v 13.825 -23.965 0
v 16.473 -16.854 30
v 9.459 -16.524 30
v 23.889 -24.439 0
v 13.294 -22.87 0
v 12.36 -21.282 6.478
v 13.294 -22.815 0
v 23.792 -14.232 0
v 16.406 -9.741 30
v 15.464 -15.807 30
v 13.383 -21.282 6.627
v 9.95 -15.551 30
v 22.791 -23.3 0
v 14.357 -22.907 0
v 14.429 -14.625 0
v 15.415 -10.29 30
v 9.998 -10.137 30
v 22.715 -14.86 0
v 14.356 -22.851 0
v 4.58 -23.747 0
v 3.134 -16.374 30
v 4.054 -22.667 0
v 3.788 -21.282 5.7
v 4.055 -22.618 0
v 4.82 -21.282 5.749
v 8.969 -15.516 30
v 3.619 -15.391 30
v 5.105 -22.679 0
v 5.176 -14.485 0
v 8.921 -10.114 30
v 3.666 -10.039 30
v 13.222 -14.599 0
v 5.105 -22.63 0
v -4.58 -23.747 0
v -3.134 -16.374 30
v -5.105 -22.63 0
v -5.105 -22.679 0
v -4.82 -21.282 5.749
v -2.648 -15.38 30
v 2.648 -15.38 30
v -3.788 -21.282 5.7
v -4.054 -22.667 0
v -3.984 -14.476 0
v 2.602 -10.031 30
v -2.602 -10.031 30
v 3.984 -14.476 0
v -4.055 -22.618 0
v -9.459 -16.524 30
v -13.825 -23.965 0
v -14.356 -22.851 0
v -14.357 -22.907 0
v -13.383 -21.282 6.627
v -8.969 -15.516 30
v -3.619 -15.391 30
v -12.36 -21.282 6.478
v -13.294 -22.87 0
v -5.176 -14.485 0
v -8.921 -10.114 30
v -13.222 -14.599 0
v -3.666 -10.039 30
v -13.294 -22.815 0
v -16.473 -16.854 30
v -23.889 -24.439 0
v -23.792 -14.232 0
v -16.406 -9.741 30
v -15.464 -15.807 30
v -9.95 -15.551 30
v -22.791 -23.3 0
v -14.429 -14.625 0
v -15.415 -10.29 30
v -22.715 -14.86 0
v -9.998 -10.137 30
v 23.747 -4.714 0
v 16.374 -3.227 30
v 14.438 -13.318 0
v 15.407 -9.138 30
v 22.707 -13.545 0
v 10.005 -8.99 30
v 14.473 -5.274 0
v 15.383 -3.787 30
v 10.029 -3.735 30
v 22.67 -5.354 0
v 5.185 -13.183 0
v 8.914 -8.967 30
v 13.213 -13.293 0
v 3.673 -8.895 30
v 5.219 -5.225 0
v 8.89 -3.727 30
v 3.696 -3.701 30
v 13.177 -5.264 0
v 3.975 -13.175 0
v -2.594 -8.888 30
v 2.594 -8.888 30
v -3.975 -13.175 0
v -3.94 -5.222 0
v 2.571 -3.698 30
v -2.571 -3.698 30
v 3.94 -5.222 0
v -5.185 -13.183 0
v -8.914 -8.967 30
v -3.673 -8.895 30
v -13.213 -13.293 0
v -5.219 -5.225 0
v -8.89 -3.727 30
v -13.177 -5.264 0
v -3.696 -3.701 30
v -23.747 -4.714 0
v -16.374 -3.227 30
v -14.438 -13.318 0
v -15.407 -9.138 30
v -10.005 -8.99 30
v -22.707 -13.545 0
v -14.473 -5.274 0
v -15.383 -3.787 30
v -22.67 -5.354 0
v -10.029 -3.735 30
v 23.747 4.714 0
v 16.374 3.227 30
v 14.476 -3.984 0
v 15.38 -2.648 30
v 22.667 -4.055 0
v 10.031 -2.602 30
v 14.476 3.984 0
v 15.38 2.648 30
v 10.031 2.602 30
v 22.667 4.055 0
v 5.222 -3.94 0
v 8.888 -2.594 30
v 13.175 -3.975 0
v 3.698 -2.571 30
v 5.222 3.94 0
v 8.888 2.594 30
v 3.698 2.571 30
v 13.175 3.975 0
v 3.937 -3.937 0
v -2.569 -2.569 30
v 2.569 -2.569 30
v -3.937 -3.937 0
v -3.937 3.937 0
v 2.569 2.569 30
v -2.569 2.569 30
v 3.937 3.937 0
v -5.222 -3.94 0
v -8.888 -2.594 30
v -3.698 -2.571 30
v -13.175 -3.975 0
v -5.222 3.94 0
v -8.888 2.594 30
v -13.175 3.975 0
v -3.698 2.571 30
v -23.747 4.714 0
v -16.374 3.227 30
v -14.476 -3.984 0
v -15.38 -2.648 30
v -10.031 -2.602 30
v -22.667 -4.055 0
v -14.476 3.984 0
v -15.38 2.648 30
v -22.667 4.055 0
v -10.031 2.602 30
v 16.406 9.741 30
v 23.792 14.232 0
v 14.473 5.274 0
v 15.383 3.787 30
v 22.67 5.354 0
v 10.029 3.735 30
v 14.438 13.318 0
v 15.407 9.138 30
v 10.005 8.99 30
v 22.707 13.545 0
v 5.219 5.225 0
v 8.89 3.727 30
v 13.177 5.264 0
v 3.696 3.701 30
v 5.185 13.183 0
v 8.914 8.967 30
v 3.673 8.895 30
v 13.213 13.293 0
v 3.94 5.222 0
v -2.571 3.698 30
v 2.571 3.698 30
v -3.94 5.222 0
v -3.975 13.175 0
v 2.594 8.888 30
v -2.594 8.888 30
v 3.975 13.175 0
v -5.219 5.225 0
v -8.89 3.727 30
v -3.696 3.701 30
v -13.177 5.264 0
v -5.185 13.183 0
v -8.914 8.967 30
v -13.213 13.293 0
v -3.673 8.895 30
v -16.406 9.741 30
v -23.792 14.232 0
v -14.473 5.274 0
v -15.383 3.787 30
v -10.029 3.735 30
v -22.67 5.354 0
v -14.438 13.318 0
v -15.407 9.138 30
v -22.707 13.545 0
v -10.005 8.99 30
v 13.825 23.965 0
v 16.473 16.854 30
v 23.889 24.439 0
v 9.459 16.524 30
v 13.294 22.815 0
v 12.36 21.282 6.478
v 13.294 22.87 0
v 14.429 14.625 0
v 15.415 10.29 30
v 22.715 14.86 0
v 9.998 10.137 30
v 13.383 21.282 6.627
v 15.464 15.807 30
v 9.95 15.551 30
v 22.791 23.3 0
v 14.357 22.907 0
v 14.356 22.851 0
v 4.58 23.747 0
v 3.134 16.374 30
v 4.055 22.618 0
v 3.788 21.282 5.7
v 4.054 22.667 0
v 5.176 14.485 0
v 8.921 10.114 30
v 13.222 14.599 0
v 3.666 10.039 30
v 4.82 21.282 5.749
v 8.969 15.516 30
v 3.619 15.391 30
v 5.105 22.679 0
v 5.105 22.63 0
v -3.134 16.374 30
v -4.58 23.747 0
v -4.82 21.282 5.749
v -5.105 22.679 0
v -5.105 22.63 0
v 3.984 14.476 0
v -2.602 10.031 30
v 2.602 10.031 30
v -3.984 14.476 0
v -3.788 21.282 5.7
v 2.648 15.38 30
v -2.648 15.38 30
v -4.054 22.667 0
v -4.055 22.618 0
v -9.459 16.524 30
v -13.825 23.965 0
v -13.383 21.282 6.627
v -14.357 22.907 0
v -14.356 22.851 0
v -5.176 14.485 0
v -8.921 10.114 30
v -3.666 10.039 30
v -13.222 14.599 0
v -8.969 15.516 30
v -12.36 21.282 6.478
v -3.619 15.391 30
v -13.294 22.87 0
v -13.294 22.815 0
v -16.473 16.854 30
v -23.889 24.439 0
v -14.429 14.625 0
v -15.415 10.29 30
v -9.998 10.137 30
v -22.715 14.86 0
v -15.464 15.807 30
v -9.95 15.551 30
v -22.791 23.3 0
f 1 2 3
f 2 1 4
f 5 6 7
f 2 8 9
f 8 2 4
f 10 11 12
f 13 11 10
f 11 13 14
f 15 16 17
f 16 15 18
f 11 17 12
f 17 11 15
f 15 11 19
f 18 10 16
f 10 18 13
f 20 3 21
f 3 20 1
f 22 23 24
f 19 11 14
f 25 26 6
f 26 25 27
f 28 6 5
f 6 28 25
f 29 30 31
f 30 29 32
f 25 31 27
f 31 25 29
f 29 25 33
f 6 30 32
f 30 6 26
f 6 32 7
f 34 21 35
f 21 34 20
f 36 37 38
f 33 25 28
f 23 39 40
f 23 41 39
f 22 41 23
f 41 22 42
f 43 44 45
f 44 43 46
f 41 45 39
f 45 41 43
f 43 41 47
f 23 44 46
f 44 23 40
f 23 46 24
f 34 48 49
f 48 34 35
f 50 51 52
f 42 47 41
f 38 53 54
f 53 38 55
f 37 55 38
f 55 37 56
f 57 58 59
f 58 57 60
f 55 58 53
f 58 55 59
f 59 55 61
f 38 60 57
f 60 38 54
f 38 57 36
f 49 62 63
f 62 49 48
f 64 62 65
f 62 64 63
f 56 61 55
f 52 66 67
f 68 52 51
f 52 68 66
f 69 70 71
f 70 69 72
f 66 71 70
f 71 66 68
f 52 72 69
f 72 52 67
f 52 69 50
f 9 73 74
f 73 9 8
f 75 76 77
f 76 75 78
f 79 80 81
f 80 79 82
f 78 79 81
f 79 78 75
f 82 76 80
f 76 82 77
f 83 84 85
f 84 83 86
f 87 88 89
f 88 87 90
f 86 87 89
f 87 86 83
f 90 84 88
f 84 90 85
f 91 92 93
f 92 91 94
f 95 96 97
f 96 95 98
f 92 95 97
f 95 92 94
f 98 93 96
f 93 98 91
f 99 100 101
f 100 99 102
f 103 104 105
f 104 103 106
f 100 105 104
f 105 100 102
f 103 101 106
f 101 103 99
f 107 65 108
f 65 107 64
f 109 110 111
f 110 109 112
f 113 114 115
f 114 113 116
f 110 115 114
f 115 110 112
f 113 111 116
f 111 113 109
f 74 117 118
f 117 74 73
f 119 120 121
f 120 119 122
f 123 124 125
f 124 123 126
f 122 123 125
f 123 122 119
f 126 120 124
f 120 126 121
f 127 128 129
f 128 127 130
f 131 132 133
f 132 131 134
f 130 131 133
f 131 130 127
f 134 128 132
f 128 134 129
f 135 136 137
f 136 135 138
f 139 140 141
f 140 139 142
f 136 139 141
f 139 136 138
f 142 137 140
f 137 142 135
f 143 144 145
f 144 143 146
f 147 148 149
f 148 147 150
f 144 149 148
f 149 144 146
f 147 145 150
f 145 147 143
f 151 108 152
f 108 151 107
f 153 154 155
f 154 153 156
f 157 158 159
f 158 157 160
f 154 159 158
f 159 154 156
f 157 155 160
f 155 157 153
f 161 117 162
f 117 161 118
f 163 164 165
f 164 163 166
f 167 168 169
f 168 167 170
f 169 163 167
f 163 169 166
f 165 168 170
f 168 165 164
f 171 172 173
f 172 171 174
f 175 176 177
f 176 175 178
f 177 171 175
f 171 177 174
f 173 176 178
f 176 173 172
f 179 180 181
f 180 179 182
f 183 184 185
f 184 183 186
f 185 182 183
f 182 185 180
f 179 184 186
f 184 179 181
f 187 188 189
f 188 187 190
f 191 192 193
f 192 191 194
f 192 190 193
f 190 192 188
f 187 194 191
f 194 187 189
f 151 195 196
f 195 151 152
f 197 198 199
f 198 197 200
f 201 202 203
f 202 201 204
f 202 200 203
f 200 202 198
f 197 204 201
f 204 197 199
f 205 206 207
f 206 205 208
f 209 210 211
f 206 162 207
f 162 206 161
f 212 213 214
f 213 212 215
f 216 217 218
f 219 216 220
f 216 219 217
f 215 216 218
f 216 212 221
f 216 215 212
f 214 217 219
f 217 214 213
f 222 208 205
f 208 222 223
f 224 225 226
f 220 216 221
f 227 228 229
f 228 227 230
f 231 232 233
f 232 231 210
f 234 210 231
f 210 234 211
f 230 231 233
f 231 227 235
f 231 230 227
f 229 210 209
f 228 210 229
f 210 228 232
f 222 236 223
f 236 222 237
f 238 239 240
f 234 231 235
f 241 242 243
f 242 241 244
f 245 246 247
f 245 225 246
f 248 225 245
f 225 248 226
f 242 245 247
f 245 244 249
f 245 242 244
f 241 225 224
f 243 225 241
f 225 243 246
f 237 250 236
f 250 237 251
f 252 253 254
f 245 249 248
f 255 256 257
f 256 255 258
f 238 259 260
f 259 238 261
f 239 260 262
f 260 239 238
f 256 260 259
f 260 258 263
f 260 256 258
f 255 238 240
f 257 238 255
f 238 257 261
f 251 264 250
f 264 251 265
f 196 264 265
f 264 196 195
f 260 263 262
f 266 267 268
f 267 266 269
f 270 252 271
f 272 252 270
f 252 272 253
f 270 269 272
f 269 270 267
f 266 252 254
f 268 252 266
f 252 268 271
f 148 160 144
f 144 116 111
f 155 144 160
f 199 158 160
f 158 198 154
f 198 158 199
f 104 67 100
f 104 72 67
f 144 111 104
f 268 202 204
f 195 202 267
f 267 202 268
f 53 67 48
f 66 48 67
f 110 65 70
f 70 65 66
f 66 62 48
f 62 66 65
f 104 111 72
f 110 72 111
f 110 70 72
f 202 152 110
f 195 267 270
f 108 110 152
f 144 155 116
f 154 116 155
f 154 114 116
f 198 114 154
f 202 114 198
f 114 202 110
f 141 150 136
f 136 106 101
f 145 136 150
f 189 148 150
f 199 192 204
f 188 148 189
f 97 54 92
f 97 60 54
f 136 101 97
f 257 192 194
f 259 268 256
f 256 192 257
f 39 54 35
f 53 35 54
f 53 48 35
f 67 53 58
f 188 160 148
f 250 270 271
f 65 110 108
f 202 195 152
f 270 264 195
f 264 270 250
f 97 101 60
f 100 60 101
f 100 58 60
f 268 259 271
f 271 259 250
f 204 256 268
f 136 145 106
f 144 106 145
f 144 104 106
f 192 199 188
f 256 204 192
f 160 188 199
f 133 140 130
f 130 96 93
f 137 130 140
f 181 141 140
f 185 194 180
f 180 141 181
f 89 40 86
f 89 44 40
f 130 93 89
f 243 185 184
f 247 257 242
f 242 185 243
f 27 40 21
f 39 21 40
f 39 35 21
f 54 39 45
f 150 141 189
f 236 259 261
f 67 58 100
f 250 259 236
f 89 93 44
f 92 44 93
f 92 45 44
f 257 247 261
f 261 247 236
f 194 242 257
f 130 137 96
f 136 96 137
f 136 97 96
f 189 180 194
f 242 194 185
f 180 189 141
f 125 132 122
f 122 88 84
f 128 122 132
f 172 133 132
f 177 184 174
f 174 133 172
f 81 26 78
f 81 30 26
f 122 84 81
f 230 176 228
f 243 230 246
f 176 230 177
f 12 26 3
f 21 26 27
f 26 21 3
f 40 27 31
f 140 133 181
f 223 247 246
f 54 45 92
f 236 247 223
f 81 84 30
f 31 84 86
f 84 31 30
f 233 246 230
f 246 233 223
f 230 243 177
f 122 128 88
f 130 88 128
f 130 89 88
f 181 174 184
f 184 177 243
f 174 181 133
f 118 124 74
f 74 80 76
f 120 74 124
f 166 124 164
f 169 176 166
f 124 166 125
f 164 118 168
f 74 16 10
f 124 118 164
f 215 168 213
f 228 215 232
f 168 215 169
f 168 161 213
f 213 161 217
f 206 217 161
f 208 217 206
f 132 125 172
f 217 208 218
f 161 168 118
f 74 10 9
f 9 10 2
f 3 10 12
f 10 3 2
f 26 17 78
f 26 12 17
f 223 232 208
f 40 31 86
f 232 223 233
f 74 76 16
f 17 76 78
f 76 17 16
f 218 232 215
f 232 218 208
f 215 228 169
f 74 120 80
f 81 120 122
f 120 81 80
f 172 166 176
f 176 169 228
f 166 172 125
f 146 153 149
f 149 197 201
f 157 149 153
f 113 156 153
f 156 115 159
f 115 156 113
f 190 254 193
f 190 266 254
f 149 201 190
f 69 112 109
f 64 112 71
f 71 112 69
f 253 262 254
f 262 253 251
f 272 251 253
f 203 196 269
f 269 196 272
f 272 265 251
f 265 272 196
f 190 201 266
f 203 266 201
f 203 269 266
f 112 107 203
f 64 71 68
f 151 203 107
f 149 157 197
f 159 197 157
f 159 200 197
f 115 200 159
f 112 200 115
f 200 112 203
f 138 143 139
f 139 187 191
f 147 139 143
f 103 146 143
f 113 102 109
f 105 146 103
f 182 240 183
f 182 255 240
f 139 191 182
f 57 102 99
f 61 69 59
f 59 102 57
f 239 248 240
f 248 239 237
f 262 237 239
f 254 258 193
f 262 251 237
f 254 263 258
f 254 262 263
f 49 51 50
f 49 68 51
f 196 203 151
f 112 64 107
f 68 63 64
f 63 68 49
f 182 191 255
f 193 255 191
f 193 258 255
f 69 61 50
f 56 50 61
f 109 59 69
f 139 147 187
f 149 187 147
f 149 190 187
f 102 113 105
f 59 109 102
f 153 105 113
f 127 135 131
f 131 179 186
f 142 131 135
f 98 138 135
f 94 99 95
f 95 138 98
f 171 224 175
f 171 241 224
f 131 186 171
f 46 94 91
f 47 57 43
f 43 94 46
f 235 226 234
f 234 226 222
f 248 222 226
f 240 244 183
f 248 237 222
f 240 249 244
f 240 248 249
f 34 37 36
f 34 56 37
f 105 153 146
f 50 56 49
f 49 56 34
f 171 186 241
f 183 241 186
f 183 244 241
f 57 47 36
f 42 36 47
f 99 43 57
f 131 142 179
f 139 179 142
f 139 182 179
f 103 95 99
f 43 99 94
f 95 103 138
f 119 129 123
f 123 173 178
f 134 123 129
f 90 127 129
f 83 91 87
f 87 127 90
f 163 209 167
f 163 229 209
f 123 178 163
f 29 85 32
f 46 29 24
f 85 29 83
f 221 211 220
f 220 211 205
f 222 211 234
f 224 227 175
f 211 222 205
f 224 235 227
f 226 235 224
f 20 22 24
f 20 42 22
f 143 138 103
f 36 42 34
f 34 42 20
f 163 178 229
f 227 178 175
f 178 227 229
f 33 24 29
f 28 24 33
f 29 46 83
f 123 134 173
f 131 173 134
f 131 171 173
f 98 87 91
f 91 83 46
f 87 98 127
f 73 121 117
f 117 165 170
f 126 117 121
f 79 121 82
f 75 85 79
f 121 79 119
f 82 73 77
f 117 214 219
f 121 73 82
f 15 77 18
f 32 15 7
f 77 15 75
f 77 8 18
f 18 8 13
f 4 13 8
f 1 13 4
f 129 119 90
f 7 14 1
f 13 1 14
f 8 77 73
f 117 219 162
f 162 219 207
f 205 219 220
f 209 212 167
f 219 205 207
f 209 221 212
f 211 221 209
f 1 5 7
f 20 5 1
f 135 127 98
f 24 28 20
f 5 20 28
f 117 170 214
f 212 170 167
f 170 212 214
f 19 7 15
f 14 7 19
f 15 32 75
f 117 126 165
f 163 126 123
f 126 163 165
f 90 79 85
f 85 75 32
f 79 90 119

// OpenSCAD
tLen=20;
bSize=7;
thickness=1.4;
spacing=0.3;
withGaps=false;
module oneSleve() {
	translate([0,0,tLen*2])rotate([0,180,-45]){ 
		difference() {
			translate([0,0,0])cylinder(tLen*3,bSize-3.1,bSize+1,$fn=4);
			translate([0,0,-0.01])cylinder(tLen*3+2,bSize-3-thickness,bSize+1-thickness,$fn=4);
//			rotate([0,0,45])cube([bSize*2,bSize*2,tLen*3]);
		}
//		translate([0,0,tLen-0.01])cylinder(20,3.5,4.5,$fn=100);
	}
}

rows=5;
cols=5;
intersection() {
translate([0,0,61+tLen*2-rows*1.2]) {
for (i=[0:rows-1]) {
	for (j=[0:cols-1]) {
		rotate([5.52*(i-(rows-1)/2),5.52*(j-(cols-1)/2),0])translate([0,0,0-(49+tLen*2)])oneSleve();
	}
}
}
translate([0,0,tLen*0.75])cube([cols*bSize*2,rows*bSize*2,tLen*1.5],center=true);

}
